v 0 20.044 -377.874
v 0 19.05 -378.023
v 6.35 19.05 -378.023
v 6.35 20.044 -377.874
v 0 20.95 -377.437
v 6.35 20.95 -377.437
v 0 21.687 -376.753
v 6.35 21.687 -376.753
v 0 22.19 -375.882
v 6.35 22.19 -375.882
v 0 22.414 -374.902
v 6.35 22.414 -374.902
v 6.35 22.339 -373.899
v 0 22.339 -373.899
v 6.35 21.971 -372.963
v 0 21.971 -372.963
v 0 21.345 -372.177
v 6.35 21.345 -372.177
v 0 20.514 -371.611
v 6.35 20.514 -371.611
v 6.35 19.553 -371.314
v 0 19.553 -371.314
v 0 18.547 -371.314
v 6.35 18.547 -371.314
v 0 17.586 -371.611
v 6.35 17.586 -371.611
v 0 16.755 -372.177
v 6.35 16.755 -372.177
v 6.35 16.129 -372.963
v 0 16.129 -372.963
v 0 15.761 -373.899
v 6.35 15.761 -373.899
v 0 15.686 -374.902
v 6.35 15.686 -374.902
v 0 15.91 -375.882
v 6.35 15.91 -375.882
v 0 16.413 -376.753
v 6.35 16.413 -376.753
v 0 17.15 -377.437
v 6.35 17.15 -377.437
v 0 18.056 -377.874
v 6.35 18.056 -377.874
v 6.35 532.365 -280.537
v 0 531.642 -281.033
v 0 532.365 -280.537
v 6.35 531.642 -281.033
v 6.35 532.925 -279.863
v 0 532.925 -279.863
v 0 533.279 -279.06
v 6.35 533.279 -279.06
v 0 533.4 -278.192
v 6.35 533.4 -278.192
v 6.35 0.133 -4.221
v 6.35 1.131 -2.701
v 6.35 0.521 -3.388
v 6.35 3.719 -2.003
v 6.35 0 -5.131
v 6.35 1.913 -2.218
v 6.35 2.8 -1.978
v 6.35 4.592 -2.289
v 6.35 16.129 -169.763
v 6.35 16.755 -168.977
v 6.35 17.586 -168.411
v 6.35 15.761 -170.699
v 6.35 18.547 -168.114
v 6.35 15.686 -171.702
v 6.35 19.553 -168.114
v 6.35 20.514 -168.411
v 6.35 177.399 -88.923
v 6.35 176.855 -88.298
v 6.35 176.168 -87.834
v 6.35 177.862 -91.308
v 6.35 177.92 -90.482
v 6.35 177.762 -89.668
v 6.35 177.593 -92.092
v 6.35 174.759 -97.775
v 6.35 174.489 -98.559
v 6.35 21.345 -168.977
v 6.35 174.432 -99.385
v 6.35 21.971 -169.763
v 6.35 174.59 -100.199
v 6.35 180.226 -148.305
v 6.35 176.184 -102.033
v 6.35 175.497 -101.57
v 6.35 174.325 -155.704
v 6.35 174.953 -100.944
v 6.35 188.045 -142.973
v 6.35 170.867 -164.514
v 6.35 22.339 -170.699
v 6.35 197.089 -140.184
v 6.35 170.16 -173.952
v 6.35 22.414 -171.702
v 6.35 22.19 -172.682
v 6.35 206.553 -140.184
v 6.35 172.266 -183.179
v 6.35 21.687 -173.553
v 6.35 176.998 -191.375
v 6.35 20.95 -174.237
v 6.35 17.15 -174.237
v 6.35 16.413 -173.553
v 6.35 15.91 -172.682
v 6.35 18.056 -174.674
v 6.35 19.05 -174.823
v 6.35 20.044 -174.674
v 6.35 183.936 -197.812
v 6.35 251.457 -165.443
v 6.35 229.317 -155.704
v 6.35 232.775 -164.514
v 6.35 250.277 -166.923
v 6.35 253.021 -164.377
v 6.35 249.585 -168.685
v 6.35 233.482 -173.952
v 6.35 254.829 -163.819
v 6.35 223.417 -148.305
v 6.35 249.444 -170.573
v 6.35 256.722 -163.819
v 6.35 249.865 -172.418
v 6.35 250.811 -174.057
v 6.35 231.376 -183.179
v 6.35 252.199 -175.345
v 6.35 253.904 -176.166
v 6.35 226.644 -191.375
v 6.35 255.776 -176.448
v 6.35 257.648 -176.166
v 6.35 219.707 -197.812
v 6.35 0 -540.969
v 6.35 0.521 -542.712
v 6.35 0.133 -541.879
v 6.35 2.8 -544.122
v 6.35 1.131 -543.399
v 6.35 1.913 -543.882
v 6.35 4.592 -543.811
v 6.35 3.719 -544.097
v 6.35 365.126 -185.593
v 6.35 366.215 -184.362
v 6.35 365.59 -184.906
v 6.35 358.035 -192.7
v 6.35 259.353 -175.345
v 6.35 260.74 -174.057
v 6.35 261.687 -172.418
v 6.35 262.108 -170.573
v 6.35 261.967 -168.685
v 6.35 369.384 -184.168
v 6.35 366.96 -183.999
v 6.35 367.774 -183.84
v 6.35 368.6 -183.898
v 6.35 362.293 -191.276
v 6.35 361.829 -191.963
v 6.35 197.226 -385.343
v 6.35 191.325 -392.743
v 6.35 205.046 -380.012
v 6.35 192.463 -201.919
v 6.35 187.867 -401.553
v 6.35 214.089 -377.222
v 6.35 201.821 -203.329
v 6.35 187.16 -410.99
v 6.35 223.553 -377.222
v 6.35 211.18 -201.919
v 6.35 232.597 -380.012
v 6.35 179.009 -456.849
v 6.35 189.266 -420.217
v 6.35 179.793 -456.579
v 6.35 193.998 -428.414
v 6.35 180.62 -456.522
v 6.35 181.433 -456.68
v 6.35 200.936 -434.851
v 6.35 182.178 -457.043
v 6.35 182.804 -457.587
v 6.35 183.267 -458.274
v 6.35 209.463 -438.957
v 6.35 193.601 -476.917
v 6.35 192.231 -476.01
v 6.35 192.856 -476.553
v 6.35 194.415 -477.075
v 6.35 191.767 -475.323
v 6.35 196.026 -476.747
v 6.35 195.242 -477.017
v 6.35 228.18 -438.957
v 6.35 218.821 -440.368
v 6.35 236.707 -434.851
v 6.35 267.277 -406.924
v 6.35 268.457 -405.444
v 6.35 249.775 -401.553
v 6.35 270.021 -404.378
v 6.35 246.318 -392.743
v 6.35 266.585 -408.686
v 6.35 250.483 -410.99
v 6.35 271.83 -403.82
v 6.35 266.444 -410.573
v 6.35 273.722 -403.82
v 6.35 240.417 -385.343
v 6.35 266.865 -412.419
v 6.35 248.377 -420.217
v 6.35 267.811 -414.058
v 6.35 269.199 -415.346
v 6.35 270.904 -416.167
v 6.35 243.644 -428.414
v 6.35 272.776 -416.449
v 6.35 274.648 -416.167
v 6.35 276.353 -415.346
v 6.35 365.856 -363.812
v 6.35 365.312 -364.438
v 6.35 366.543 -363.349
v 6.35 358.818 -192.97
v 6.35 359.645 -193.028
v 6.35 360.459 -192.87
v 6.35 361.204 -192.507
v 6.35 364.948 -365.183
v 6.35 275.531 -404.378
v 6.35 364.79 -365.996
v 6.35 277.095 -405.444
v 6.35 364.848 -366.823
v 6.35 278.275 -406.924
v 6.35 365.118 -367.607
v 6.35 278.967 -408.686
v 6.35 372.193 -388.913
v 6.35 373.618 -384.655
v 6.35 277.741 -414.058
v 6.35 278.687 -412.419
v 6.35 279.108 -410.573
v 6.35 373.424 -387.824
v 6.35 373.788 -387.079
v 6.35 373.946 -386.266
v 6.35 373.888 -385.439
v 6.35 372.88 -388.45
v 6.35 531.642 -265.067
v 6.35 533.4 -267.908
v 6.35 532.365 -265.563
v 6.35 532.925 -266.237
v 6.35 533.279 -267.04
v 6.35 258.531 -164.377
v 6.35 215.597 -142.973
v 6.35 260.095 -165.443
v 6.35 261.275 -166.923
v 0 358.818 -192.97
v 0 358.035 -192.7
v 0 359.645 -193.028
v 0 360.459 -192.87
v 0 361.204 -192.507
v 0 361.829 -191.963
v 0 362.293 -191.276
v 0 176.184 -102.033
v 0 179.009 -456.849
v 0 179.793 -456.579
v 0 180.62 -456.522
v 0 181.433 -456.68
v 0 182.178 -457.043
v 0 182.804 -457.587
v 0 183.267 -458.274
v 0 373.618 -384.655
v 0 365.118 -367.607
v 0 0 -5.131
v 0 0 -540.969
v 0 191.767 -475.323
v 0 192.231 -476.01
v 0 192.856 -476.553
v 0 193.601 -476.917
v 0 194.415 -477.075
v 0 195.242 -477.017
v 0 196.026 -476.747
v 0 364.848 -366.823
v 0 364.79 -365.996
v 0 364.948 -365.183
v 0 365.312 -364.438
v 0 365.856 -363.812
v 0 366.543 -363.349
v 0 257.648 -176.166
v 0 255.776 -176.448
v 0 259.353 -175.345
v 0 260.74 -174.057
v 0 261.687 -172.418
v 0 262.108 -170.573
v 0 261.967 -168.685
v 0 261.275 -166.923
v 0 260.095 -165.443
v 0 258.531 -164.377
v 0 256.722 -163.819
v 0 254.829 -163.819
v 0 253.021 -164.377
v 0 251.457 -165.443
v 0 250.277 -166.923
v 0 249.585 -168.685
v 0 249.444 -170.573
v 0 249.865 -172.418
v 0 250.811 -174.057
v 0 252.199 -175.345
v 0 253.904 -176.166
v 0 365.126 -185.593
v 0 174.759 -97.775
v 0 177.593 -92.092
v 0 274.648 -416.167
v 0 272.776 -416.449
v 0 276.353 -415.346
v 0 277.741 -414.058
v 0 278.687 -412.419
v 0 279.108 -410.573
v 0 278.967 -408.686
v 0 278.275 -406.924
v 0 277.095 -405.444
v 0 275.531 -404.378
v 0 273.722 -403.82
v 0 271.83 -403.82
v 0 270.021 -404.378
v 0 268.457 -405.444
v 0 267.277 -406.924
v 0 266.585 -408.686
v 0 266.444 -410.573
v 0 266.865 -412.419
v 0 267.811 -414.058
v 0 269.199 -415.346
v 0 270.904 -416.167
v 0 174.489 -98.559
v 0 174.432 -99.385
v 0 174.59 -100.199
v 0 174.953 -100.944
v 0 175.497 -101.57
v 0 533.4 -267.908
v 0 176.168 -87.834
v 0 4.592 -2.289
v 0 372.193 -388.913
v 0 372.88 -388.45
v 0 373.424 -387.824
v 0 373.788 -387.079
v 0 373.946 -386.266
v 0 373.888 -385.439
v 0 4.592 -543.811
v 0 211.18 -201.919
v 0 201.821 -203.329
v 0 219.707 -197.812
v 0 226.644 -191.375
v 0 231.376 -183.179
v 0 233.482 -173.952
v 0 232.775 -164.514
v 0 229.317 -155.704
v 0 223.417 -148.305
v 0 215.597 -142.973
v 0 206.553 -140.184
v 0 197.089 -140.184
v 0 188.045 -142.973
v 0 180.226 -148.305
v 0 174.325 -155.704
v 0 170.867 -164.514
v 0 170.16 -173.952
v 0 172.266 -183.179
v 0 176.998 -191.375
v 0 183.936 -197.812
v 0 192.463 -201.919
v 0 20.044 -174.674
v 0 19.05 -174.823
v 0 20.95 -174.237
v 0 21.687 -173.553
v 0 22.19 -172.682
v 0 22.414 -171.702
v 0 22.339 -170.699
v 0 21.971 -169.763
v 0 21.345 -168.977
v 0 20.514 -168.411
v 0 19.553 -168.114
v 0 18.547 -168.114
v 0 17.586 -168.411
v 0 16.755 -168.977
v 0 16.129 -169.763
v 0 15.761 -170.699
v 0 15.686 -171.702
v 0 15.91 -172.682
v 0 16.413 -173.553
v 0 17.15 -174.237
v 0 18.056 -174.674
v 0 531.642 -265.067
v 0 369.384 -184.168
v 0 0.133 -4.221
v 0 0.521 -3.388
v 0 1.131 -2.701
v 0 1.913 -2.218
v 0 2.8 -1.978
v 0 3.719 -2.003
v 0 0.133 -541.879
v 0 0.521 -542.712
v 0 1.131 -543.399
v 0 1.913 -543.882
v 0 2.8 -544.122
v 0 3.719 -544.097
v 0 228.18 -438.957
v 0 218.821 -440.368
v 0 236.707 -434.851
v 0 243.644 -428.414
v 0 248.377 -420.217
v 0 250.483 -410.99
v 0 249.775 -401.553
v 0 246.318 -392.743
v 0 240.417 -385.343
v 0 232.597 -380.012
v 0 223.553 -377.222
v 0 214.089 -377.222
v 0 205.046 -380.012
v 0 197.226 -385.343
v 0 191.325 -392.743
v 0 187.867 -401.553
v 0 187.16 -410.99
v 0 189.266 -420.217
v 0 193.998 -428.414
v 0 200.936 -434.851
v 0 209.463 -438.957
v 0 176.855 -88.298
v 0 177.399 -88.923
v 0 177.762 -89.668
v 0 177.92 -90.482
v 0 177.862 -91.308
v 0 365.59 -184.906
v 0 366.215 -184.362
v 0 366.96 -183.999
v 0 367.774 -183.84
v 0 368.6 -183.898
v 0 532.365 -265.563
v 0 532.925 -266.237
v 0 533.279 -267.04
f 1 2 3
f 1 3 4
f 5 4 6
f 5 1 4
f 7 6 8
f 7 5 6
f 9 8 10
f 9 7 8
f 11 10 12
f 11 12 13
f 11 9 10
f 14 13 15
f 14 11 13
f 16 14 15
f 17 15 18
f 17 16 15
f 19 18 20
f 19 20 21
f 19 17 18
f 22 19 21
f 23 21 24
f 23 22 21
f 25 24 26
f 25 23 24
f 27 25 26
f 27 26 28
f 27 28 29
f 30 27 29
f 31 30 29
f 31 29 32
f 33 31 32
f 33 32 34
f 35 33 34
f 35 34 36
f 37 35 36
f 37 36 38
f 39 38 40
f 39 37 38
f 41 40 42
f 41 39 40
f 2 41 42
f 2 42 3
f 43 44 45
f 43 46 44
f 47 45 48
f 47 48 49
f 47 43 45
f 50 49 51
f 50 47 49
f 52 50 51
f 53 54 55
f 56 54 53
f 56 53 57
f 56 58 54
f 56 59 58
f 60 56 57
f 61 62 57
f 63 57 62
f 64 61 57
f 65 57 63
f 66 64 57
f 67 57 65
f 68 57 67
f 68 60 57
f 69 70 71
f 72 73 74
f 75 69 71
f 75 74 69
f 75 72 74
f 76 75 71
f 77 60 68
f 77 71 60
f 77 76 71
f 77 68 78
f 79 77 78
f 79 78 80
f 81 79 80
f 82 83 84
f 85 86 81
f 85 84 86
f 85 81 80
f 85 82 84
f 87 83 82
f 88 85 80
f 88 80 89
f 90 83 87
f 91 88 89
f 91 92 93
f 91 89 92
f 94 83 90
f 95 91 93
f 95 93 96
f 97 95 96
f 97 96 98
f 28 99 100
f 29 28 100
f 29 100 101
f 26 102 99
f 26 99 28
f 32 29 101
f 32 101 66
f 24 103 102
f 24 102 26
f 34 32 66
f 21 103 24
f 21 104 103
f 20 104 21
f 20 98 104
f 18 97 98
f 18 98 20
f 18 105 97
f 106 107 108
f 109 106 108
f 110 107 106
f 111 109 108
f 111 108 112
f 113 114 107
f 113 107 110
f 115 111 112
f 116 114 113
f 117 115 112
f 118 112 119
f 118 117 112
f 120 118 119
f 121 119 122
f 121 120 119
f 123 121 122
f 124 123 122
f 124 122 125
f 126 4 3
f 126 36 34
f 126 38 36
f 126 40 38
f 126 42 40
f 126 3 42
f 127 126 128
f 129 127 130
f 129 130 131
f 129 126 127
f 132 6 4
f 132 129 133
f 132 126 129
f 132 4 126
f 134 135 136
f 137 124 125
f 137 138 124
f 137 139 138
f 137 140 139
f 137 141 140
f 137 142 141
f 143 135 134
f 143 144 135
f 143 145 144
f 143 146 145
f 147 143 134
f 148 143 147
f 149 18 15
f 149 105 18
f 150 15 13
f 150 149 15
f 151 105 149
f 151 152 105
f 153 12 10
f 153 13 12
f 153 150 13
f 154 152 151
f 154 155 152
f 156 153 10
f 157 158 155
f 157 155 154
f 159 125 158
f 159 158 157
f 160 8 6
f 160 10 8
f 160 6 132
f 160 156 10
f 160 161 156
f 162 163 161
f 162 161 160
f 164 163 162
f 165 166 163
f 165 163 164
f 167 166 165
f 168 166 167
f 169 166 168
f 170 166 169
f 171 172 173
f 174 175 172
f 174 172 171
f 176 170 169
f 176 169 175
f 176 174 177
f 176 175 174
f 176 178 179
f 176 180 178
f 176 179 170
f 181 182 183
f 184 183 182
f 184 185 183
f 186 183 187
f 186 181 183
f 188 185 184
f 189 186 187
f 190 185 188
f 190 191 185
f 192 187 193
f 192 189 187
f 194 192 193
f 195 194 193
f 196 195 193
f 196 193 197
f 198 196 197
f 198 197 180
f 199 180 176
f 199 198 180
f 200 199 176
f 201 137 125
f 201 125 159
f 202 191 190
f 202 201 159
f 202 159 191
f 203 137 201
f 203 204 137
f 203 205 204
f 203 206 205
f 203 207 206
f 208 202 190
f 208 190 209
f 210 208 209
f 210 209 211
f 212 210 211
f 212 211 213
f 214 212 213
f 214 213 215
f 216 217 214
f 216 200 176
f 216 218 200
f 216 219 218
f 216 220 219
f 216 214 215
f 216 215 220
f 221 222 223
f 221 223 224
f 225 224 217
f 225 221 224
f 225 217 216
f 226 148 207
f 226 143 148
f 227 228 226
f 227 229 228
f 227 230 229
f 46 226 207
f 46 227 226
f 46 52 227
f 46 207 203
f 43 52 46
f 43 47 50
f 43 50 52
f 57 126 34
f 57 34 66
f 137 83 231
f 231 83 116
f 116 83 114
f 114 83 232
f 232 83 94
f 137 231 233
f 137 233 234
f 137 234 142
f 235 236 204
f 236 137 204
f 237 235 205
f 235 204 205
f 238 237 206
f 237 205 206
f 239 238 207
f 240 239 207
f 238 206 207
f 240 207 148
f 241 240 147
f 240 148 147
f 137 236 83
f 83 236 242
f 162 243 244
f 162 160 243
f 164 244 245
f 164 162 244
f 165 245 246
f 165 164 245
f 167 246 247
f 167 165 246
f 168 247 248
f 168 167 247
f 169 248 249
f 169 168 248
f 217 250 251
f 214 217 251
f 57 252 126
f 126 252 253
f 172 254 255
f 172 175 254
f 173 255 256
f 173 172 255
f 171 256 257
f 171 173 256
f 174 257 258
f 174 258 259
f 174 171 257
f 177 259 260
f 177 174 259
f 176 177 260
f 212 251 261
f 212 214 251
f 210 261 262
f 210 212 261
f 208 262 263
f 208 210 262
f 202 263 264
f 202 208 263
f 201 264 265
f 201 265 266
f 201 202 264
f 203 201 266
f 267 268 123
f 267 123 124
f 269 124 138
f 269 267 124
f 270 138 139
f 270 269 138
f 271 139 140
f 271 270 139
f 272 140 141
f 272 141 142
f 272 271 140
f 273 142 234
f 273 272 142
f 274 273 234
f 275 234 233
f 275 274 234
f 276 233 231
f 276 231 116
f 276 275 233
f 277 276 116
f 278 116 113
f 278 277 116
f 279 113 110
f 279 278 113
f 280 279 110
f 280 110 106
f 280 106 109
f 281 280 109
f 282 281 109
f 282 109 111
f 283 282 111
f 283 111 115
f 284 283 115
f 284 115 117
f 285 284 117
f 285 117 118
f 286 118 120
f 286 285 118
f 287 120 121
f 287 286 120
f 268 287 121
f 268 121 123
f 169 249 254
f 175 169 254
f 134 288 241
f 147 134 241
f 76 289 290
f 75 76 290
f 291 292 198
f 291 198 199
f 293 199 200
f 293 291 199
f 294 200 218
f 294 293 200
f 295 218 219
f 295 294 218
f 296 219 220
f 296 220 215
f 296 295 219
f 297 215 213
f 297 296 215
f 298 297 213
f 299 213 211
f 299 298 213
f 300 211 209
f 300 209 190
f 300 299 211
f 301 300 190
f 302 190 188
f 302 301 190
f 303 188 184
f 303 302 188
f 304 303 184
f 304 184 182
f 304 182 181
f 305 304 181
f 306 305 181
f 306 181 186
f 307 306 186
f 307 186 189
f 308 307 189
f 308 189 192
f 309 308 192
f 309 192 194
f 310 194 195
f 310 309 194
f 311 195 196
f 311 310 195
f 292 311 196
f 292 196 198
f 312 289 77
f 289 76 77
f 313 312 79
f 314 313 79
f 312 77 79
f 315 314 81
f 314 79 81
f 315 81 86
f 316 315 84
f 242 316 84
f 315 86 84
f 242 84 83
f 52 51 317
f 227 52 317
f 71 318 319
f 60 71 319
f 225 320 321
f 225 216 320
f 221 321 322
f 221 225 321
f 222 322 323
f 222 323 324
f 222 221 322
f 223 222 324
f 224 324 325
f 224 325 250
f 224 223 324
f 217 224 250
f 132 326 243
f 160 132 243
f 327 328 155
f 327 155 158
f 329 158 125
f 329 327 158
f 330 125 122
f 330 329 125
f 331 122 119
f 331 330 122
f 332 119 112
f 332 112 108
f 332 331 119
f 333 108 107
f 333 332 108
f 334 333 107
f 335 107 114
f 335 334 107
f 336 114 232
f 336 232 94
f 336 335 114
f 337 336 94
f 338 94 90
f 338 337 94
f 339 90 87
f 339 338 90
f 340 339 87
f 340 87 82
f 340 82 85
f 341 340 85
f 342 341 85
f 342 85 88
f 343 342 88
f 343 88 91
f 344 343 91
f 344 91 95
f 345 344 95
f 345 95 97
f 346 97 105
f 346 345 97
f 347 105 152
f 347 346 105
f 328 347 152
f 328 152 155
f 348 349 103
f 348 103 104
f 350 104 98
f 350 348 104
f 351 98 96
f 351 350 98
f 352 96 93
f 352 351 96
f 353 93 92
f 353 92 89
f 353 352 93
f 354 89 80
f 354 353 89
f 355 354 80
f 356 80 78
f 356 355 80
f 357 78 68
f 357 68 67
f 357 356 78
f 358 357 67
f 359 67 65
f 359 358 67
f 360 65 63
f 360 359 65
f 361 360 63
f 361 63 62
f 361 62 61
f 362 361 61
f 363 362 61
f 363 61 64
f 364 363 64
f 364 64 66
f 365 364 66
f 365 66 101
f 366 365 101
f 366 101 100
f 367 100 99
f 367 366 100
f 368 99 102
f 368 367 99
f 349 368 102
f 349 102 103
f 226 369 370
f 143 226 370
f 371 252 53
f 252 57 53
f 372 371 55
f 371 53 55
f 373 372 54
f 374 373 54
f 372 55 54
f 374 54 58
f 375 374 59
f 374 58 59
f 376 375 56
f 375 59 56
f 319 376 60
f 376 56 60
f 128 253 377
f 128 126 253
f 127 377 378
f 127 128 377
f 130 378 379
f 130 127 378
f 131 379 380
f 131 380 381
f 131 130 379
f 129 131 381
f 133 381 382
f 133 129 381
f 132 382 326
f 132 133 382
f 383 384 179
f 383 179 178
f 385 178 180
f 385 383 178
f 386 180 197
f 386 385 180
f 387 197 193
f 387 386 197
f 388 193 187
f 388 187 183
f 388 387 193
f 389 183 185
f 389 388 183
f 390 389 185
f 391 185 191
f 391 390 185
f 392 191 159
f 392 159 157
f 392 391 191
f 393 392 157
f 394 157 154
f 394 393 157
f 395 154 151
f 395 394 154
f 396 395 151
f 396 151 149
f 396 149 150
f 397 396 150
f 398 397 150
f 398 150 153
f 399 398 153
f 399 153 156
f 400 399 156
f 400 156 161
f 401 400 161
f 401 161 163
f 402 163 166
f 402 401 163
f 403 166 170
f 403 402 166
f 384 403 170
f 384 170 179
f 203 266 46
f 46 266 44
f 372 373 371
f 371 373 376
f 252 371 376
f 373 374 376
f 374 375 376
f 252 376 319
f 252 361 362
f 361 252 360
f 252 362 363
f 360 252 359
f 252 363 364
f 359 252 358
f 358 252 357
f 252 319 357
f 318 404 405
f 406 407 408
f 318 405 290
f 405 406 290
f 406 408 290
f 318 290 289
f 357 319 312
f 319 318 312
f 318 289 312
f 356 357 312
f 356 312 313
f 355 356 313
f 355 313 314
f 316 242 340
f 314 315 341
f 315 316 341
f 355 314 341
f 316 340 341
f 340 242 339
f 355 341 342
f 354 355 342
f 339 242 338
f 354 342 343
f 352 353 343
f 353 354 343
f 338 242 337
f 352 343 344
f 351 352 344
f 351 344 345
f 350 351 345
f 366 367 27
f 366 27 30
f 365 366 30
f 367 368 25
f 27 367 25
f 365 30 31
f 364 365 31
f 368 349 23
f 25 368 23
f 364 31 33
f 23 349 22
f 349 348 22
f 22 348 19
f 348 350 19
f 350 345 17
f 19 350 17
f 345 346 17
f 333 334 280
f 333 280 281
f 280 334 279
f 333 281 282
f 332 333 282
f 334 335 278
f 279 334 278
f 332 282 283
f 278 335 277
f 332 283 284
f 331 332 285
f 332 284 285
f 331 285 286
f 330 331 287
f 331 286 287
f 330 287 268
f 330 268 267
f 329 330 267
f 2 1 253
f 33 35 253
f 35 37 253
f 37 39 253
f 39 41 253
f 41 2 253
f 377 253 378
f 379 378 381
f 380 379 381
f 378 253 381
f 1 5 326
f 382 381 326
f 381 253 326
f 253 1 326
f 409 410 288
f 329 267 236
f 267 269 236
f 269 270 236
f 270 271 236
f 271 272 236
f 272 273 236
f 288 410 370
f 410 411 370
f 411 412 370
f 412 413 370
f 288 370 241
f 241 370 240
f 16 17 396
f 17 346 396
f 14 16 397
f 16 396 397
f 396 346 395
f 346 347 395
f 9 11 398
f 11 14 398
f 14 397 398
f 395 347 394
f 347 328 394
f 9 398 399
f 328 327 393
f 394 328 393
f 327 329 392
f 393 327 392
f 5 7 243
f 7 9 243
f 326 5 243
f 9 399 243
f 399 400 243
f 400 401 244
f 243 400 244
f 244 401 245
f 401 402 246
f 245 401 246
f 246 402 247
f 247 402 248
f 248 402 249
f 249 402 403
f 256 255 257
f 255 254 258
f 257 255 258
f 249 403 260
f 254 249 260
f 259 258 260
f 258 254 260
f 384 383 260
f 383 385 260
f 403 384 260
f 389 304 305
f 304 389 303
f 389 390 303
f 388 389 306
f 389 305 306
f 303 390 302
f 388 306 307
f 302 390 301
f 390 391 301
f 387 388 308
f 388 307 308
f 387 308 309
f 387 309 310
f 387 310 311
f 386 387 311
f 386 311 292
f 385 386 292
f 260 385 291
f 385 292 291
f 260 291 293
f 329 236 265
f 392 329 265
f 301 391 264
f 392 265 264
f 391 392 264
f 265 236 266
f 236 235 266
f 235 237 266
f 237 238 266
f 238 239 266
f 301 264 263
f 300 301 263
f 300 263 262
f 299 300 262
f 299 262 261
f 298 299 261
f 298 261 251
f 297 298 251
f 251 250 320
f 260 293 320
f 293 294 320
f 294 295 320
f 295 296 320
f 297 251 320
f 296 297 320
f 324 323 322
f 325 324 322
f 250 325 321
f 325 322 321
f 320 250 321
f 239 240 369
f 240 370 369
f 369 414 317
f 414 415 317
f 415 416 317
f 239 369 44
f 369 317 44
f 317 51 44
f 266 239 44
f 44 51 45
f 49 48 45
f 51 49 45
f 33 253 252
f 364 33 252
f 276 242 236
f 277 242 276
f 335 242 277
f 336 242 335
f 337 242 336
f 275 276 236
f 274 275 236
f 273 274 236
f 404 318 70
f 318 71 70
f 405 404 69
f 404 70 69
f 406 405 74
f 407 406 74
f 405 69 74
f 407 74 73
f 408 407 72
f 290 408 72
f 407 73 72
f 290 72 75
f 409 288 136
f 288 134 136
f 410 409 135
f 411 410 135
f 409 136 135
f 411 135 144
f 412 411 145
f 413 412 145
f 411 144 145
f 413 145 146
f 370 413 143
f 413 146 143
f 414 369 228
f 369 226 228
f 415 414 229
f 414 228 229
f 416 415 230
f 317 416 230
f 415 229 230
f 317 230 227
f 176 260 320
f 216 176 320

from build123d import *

# Parameters (mm, degrees)
SKETCH1_R           = 3.3734375
SKETCH1_R_2         = 6.35
SKETCH1_R_3         = 31.75
BOSS_EXTRUDE1_DEPTH = 6.35
FILLET1_R           = 3.175


with BuildPart() as part:
    # Sketch1 → Boss-Extrude1 (new body)
    with BuildSketch(Plane(origin=(0, 0, 0), x_dir=(0, 0, -1), z_dir=(1, 0, 0))):
        Polygon((0, 0), (546.1, 0), (455.432604376, 181.850662278), (478.163937161, 193.184086731), (387.496541537, 375.034749008), (364.765208752, 363.701324555), (280.156570264, 533.4), (265.943429736, 533.4), (182.751469304, 366.542741153), (194.117135697, 360.876028927), (100.61638396, 173.342533453), (89.250717567, 179.009245679), align=None)
        with Locations((171.45, 19.05)):
            Circle(SKETCH1_R, mode=Mode.SUBTRACT)
        with Locations((374.65, 19.05)):
            Circle(SKETCH1_R, mode=Mode.SUBTRACT)
        with Locations((410.098906564, 272.775993416)):
            Circle(SKETCH1_R_2, mode=Mode.SUBTRACT)
        with Locations((170.098092613, 255.775856737)):
            Circle(SKETCH1_R_2, mode=Mode.SUBTRACT)
        with Locations((171.579254548, 201.821183313)):
            Circle(SKETCH1_R_3, mode=Mode.SUBTRACT)
        with Locations((408.617744629, 218.821319992)):
            Circle(SKETCH1_R_3, mode=Mode.SUBTRACT)
    extrude(amount=BOSS_EXTRUDE1_DEPTH)

    # Fillet1
    fillet1_edges = [part.edges().sort_by_distance(p)[0] for p in [
        (3.175, 179.009245679, -89.250717567),
        (3.175, 173.342533453, -100.61638396),
        (3.175, 360.876028927, -194.117135697),
        (3.175, 366.542741153, -182.751469304),
        (3.175, 533.4, -265.943429736),
        (3.175, 533.4, -280.156570264),
        (3.175, 363.701324555, -364.765208752),
        (3.175, 375.034749008, -387.496541537),
        (3.175, 193.184086731, -478.163937161),
        (3.175, 181.850662278, -455.432604376),
        (3.175, 0, -546.1),
        (3.175, 0, 0),
    ]]
    fillet(fillet1_edges, radius=FILLET1_R)


solid = part.part
